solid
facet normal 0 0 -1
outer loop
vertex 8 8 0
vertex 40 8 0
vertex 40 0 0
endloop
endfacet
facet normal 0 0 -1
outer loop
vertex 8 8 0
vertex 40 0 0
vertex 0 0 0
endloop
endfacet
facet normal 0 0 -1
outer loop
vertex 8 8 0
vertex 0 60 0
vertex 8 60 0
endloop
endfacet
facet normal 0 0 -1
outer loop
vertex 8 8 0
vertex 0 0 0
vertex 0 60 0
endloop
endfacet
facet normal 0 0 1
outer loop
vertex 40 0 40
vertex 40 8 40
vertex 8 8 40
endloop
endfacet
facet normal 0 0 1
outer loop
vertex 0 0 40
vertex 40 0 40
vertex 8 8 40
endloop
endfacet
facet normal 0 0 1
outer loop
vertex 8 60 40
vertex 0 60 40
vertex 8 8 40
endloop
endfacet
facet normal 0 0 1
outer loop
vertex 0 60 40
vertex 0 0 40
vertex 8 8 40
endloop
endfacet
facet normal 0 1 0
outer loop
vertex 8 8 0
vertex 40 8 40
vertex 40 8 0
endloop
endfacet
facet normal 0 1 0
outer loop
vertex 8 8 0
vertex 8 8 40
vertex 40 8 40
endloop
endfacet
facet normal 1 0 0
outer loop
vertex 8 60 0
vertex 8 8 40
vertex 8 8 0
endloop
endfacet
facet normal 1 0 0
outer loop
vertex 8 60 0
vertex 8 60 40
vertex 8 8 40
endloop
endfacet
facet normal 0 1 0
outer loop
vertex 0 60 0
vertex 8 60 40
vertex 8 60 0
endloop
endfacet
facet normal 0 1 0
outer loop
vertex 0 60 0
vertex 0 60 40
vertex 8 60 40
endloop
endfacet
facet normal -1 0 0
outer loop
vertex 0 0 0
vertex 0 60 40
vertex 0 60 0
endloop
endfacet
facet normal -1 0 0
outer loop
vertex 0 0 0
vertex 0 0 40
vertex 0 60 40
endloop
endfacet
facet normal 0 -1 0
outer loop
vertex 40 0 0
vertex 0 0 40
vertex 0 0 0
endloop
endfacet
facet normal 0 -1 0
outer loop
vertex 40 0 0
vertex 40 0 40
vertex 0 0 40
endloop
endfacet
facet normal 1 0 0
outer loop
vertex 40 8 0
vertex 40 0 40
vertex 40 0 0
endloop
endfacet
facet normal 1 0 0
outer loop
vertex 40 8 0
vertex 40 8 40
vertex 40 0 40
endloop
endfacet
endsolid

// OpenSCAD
$fn = 32;

// ----------------------------------------------------------------------
// Structural section: angle 40 x 60 mm
// ----------------------------------------------------------------------

// --- parameters (mm) ---
sec_w = 40;               // leg width, X
sec_h = 60;               // leg height, Y
flange_t = 8;             // leg thickness
plate_t = 40;             // cut length, Z (extrusion height)

profile = [[0, 0], [40, 0], [40, 8], [8, 8], [8, 60], [0, 60]];  // primary outline, 6 points, counter clockwise

// --- the one profile operation ---
linear_extrude(height = plate_t) polygon(points = profile);
